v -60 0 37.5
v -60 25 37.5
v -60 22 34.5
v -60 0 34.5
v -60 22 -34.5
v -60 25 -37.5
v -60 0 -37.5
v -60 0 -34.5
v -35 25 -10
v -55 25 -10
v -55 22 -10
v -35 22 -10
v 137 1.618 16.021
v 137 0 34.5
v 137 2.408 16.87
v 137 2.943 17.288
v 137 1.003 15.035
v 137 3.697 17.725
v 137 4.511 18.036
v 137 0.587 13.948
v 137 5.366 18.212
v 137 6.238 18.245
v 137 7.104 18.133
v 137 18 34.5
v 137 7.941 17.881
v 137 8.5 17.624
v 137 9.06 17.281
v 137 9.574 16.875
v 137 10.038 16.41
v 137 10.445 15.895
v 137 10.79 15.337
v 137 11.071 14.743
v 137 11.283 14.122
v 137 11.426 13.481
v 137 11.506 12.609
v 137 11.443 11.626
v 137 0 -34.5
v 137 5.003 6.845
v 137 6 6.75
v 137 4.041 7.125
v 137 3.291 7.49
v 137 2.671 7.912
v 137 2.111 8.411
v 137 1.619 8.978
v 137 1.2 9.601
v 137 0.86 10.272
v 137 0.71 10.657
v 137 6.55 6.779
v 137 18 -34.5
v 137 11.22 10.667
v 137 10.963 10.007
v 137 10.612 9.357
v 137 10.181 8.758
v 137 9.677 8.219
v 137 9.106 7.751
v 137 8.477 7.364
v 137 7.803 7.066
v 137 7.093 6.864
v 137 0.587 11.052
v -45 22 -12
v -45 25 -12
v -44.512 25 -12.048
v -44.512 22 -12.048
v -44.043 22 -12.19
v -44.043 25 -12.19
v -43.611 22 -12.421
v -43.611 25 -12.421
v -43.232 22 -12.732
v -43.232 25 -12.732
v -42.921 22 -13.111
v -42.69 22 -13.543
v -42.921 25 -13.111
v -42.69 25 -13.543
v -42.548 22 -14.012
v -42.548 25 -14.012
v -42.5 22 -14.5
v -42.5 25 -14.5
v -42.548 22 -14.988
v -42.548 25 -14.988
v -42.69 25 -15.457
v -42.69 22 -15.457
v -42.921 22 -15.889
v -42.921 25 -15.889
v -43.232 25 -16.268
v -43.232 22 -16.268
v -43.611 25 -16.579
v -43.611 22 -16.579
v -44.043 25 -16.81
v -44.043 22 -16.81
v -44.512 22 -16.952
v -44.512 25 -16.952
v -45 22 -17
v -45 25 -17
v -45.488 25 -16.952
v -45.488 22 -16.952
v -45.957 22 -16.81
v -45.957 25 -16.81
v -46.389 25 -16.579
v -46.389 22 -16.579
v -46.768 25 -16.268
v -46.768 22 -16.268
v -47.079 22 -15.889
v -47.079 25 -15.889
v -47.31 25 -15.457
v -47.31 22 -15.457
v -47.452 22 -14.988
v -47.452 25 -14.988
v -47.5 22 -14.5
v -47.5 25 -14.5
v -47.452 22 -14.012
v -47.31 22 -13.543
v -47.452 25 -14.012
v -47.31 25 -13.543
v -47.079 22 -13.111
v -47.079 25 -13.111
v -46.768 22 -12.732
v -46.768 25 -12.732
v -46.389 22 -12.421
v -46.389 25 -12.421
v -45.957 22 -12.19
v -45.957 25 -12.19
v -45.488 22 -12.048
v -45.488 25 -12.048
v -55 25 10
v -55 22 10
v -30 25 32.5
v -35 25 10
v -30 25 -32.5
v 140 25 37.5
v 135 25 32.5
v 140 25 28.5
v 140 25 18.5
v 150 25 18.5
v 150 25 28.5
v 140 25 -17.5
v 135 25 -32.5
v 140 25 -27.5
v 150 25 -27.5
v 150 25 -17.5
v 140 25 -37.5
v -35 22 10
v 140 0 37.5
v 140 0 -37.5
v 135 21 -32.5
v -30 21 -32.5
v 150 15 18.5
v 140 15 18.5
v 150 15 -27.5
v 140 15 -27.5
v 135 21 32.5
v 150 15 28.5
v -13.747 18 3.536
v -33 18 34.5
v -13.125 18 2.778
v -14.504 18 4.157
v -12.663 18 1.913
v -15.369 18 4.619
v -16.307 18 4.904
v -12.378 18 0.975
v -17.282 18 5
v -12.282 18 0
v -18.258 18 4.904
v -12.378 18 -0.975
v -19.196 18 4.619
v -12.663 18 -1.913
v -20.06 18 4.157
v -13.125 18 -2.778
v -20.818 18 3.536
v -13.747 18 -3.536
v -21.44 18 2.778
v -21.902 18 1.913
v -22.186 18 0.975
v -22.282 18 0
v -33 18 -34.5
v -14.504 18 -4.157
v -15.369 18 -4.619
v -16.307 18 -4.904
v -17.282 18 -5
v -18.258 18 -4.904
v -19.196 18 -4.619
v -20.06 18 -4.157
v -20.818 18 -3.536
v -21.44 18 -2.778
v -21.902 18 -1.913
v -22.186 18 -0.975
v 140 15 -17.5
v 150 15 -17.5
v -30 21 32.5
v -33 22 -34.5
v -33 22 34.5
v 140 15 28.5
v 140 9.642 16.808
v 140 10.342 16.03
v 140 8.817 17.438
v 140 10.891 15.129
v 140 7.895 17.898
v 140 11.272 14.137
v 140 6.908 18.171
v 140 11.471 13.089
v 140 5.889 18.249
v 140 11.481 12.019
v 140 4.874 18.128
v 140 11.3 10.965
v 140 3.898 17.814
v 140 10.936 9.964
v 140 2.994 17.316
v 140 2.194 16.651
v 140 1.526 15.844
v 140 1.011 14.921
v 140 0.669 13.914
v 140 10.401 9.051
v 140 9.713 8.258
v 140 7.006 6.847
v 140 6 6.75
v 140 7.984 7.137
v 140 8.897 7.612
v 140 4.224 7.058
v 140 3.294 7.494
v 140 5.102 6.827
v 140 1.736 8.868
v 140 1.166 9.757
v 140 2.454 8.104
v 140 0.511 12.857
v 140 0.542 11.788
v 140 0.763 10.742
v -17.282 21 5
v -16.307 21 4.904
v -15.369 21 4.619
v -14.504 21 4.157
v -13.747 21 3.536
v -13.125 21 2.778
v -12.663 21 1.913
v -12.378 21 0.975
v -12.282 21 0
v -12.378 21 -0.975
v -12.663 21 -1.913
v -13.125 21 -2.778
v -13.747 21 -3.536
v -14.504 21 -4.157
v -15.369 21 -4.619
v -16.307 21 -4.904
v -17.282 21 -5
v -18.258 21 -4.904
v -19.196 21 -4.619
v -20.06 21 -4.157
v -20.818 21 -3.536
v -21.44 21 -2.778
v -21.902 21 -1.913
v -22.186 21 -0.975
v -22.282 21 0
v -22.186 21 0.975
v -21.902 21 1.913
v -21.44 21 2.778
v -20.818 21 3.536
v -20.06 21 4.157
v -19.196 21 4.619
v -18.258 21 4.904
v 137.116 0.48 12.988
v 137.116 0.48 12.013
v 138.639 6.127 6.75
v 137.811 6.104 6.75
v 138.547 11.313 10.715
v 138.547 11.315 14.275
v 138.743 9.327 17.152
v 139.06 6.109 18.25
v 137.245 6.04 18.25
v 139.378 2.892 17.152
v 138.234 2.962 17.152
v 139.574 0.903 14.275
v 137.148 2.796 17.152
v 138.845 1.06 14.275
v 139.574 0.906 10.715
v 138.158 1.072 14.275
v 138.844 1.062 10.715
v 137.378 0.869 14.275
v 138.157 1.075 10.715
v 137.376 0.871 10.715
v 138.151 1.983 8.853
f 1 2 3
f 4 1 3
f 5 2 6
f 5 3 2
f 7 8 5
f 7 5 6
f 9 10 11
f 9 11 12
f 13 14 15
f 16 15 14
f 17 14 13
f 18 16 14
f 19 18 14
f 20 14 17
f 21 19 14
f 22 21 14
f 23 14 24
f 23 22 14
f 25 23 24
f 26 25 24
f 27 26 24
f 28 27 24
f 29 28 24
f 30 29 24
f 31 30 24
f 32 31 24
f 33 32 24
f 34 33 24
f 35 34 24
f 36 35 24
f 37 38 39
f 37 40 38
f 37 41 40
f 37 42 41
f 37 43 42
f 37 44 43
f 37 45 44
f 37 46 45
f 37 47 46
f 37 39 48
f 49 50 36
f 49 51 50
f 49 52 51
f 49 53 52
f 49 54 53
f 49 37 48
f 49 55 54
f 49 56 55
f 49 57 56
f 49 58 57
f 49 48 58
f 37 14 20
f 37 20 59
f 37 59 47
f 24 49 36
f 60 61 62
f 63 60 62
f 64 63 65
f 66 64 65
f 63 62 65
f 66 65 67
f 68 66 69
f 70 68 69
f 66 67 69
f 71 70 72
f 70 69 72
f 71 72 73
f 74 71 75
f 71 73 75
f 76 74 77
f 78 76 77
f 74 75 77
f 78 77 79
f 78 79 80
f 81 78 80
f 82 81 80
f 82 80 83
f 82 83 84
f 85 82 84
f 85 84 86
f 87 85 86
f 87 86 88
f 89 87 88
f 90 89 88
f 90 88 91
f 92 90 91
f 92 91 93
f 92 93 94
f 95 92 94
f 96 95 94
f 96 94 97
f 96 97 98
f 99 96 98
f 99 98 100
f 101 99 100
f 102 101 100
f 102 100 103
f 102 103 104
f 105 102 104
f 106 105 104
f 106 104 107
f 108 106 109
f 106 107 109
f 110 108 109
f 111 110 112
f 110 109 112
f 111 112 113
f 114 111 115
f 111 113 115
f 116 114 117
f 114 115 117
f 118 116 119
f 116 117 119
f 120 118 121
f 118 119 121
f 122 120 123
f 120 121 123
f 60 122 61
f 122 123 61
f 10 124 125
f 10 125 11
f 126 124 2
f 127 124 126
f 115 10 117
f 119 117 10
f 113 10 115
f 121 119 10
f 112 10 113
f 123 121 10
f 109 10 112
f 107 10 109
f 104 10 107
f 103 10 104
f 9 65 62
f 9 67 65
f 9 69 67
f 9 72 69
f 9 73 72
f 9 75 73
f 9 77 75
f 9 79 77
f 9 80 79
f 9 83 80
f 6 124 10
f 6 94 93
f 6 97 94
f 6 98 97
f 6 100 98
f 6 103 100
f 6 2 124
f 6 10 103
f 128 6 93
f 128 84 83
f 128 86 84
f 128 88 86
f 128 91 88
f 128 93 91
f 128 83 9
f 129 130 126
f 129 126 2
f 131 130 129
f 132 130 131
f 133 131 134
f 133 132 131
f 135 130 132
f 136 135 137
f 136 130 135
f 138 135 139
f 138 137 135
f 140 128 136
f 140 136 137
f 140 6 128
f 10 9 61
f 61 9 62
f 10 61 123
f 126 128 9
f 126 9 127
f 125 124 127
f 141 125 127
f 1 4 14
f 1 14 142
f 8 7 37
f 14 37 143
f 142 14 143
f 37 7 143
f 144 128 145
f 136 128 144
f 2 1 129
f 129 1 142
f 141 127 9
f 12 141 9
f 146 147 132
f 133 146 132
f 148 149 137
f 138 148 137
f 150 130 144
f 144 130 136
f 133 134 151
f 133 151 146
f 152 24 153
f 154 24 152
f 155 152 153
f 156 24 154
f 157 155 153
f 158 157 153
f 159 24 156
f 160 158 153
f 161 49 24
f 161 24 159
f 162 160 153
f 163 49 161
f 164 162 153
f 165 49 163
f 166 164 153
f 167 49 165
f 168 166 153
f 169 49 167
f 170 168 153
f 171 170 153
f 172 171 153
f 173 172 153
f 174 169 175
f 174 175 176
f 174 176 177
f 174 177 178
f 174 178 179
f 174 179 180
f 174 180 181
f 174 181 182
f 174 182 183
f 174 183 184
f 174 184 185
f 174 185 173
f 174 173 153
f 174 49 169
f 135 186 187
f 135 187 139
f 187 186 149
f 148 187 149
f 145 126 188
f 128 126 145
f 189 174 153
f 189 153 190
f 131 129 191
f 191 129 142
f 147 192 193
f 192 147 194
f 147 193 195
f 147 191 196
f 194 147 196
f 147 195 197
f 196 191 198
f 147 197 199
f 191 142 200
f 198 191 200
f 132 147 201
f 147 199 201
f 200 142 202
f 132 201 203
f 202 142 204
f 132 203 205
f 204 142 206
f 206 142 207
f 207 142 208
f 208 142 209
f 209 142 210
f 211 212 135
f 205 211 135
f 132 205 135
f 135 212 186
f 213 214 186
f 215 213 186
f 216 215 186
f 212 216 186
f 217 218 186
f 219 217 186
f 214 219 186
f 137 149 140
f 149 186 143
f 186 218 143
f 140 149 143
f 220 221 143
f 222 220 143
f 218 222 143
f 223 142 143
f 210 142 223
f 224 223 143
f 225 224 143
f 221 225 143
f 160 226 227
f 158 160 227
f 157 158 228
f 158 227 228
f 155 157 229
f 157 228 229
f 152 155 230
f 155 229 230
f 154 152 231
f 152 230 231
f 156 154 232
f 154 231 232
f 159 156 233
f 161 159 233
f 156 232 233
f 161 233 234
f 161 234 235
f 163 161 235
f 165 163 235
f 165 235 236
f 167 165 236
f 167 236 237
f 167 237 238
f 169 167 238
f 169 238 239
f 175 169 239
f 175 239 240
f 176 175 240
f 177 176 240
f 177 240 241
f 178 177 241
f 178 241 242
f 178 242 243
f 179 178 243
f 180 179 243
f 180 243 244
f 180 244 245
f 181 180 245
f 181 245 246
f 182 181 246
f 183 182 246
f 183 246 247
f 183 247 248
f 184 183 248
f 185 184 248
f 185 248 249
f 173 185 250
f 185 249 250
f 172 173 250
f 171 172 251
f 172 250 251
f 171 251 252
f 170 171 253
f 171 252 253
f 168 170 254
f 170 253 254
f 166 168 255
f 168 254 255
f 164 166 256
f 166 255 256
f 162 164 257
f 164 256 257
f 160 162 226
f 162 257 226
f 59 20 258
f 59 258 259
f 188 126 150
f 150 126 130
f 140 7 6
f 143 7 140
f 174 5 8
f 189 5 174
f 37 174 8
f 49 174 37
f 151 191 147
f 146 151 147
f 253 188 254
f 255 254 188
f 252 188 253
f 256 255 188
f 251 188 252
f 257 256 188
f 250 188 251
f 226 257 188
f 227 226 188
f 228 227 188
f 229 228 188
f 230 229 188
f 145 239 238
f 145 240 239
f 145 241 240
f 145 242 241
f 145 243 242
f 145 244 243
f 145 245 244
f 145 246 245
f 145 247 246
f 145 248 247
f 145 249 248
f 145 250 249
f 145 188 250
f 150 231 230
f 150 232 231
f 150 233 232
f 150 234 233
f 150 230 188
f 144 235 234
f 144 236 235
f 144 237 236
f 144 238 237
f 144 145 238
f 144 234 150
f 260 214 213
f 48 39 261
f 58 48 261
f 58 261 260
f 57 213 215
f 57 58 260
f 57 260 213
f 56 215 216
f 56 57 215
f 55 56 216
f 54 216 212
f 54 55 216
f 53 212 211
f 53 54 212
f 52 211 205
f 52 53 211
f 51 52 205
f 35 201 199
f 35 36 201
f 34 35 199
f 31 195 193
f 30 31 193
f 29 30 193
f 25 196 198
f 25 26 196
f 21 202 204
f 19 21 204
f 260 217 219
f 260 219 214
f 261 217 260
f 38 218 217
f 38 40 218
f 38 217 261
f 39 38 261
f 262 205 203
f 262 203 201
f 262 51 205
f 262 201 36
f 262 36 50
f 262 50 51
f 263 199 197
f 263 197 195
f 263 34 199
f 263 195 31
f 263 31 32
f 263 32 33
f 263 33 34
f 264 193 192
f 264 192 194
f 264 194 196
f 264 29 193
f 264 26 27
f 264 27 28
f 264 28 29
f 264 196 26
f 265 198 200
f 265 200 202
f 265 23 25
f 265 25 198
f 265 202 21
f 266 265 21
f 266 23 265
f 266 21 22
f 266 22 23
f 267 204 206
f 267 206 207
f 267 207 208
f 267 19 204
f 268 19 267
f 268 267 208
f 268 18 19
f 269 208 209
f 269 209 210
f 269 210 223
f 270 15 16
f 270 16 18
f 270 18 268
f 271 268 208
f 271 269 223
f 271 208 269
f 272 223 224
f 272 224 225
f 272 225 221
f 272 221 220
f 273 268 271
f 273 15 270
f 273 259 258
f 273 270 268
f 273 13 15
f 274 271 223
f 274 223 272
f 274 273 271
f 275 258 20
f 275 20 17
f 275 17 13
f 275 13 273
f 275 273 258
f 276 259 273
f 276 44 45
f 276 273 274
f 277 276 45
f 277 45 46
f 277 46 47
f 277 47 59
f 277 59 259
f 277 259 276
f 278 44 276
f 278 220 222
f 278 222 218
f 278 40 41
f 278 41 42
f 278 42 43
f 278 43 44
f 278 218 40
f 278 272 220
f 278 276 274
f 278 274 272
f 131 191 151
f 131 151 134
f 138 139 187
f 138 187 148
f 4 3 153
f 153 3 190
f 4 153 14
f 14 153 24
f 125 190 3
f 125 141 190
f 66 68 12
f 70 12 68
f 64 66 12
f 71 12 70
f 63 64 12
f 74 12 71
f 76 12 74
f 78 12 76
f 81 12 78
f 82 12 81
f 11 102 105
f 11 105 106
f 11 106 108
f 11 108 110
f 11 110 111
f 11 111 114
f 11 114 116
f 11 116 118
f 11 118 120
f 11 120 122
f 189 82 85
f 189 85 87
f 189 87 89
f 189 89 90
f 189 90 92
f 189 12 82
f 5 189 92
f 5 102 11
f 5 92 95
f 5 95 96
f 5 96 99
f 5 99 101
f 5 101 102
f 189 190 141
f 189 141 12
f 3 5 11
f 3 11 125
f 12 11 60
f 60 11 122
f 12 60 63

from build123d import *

# Parameters (mm, degrees)
SKETCH1_W           = 200
SKETCH1_H           = 75
BOSS_EXTRUDE1_DEPTH = 25
SKETCH9_W           = 165
SKETCH9_H           = 65
CUT_EXTRUDE5_DEPTH  = 4
SHELL3_START        = -34.5
SHELL3_DEPTH        = 69
SKETCH14_W          = 10
SKETCH14_H          = 10
BOSS_EXTRUDE5_DEPTH = 10
SKETCH15_R          = 5
CUT_EXTRUDE7_DEPTH  = 157.036053526
SKETCH16_W          = 20
SKETCH16_H          = 20
CUT_EXTRUDE8_DEPTH  = 157.624551077
SKETCH19_RX         = 5.75
SKETCH19_RY         = 5.5
SKETCH21_R          = 2.5
CUT_EXTRUDE9_DEPTH  = 157.624551117


# Read off the part's stored shape, not the designer's step: Shell3
with BuildPart() as part:
    # Sketch1 → Boss-Extrude1 (new body)
    with BuildSketch(Plane(origin=(0, 0, 0), x_dir=(1, 0, 0), z_dir=(0, 1, 0))):
        with Locations((40, 0)):
            Rectangle(SKETCH1_W, SKETCH1_H)
    extrude(amount=BOSS_EXTRUDE1_DEPTH)

    # Sketch9 → Cut-Extrude5 (cut)
    with BuildSketch(Plane(origin=(0, 25, 0), x_dir=(1, 0, 0), z_dir=(0, 1, 0))):
        with Locations((52.5, 0)):
            Rectangle(SKETCH9_W, SKETCH9_H)
    extrude(amount=-CUT_EXTRUDE5_DEPTH, mode=Mode.SUBTRACT)

    # Shell3 outline → Shell3 (cut)
    with BuildSketch(Plane.XY.offset(SHELL3_START)):
        Polygon((137, 0), (137, 18), (-33, 18), (-33, 22), (-60, 22), (-60, 0), align=None)
    extrude(amount=SHELL3_DEPTH, mode=Mode.SUBTRACT)

    # Sketch14 → Boss-Extrude5 (add)
    with BuildSketch(Plane(origin=(140, 0, 0), x_dir=(0, 0, -1), z_dir=(1, 0, 0))):
        with Locations((-23.5, 20)):
            Rectangle(SKETCH14_W, SKETCH14_H)
        with Locations((22.5, 20)):
            Rectangle(SKETCH14_W, SKETCH14_H)
    extrude(amount=BOSS_EXTRUDE5_DEPTH)

    # Sketch15 → Cut-Extrude7 (cut, through all)
    with BuildSketch(Plane(origin=(0, 21, 0), x_dir=(1, 0, 0), z_dir=(0, 1, 0))):
        with Locations(Location((-17.28231035, 0, 0), (0, 0, 270))):
            Circle(SKETCH15_R)
    extrude(amount=-CUT_EXTRUDE7_DEPTH, mode=Mode.SUBTRACT)

    # Sketch16 → Cut-Extrude8 (cut, through all)
    with BuildSketch(Plane(origin=(0, 25, 0), x_dir=(1, 0, 0), z_dir=(0, 1, 0))):
        with Locations((-45, 0)):
            Rectangle(SKETCH16_W, SKETCH16_H)
    extrude(amount=-CUT_EXTRUDE8_DEPTH, mode=Mode.SUBTRACT)

    # Cut-Sweep2: sweep along a path in Sketch20
    with BuildLine() as cut_sweep2_path:  # in the path sketch's own coordinates; laid on its plane below (add() does not lay a ready-made edge on the line's plane)
        add(Edge.make_bspline(
            [(-140, 6), (-136.19888528, 6.630281352), (-133.075750061, 4.182881523)],
            knots=[0, 0, 0, 1, 1, 1], degree=2))
    # Sketch19 → Cut-Sweep2 (sweep, cut)
    with BuildSketch(Plane(origin=(140, 0, 0), x_dir=(0, 0, -1), z_dir=(1, 0, 0))):
        with Locations(Location((-12.5, 6), (0, 0, 0))):
            Ellipse(SKETCH19_RX, SKETCH19_RY)
    sweep(path=Plane(origin=(0, 0, 0), x_dir=(-1, 0, 0), z_dir=(0, 0, -1)) * cut_sweep2_path.line, mode=Mode.SUBTRACT)

    # Sketch21 → Cut-Extrude9 (cut, through all)
    with BuildSketch(Plane(origin=(0, 25, 0), x_dir=(1, 0, 0), z_dir=(0, 1, 0))):
        with Locations(Location((-45, 14.5, 0), (0, 0, 270))):
            Circle(SKETCH21_R)
    extrude(amount=-CUT_EXTRUDE9_DEPTH, mode=Mode.SUBTRACT)


solid = part.part
